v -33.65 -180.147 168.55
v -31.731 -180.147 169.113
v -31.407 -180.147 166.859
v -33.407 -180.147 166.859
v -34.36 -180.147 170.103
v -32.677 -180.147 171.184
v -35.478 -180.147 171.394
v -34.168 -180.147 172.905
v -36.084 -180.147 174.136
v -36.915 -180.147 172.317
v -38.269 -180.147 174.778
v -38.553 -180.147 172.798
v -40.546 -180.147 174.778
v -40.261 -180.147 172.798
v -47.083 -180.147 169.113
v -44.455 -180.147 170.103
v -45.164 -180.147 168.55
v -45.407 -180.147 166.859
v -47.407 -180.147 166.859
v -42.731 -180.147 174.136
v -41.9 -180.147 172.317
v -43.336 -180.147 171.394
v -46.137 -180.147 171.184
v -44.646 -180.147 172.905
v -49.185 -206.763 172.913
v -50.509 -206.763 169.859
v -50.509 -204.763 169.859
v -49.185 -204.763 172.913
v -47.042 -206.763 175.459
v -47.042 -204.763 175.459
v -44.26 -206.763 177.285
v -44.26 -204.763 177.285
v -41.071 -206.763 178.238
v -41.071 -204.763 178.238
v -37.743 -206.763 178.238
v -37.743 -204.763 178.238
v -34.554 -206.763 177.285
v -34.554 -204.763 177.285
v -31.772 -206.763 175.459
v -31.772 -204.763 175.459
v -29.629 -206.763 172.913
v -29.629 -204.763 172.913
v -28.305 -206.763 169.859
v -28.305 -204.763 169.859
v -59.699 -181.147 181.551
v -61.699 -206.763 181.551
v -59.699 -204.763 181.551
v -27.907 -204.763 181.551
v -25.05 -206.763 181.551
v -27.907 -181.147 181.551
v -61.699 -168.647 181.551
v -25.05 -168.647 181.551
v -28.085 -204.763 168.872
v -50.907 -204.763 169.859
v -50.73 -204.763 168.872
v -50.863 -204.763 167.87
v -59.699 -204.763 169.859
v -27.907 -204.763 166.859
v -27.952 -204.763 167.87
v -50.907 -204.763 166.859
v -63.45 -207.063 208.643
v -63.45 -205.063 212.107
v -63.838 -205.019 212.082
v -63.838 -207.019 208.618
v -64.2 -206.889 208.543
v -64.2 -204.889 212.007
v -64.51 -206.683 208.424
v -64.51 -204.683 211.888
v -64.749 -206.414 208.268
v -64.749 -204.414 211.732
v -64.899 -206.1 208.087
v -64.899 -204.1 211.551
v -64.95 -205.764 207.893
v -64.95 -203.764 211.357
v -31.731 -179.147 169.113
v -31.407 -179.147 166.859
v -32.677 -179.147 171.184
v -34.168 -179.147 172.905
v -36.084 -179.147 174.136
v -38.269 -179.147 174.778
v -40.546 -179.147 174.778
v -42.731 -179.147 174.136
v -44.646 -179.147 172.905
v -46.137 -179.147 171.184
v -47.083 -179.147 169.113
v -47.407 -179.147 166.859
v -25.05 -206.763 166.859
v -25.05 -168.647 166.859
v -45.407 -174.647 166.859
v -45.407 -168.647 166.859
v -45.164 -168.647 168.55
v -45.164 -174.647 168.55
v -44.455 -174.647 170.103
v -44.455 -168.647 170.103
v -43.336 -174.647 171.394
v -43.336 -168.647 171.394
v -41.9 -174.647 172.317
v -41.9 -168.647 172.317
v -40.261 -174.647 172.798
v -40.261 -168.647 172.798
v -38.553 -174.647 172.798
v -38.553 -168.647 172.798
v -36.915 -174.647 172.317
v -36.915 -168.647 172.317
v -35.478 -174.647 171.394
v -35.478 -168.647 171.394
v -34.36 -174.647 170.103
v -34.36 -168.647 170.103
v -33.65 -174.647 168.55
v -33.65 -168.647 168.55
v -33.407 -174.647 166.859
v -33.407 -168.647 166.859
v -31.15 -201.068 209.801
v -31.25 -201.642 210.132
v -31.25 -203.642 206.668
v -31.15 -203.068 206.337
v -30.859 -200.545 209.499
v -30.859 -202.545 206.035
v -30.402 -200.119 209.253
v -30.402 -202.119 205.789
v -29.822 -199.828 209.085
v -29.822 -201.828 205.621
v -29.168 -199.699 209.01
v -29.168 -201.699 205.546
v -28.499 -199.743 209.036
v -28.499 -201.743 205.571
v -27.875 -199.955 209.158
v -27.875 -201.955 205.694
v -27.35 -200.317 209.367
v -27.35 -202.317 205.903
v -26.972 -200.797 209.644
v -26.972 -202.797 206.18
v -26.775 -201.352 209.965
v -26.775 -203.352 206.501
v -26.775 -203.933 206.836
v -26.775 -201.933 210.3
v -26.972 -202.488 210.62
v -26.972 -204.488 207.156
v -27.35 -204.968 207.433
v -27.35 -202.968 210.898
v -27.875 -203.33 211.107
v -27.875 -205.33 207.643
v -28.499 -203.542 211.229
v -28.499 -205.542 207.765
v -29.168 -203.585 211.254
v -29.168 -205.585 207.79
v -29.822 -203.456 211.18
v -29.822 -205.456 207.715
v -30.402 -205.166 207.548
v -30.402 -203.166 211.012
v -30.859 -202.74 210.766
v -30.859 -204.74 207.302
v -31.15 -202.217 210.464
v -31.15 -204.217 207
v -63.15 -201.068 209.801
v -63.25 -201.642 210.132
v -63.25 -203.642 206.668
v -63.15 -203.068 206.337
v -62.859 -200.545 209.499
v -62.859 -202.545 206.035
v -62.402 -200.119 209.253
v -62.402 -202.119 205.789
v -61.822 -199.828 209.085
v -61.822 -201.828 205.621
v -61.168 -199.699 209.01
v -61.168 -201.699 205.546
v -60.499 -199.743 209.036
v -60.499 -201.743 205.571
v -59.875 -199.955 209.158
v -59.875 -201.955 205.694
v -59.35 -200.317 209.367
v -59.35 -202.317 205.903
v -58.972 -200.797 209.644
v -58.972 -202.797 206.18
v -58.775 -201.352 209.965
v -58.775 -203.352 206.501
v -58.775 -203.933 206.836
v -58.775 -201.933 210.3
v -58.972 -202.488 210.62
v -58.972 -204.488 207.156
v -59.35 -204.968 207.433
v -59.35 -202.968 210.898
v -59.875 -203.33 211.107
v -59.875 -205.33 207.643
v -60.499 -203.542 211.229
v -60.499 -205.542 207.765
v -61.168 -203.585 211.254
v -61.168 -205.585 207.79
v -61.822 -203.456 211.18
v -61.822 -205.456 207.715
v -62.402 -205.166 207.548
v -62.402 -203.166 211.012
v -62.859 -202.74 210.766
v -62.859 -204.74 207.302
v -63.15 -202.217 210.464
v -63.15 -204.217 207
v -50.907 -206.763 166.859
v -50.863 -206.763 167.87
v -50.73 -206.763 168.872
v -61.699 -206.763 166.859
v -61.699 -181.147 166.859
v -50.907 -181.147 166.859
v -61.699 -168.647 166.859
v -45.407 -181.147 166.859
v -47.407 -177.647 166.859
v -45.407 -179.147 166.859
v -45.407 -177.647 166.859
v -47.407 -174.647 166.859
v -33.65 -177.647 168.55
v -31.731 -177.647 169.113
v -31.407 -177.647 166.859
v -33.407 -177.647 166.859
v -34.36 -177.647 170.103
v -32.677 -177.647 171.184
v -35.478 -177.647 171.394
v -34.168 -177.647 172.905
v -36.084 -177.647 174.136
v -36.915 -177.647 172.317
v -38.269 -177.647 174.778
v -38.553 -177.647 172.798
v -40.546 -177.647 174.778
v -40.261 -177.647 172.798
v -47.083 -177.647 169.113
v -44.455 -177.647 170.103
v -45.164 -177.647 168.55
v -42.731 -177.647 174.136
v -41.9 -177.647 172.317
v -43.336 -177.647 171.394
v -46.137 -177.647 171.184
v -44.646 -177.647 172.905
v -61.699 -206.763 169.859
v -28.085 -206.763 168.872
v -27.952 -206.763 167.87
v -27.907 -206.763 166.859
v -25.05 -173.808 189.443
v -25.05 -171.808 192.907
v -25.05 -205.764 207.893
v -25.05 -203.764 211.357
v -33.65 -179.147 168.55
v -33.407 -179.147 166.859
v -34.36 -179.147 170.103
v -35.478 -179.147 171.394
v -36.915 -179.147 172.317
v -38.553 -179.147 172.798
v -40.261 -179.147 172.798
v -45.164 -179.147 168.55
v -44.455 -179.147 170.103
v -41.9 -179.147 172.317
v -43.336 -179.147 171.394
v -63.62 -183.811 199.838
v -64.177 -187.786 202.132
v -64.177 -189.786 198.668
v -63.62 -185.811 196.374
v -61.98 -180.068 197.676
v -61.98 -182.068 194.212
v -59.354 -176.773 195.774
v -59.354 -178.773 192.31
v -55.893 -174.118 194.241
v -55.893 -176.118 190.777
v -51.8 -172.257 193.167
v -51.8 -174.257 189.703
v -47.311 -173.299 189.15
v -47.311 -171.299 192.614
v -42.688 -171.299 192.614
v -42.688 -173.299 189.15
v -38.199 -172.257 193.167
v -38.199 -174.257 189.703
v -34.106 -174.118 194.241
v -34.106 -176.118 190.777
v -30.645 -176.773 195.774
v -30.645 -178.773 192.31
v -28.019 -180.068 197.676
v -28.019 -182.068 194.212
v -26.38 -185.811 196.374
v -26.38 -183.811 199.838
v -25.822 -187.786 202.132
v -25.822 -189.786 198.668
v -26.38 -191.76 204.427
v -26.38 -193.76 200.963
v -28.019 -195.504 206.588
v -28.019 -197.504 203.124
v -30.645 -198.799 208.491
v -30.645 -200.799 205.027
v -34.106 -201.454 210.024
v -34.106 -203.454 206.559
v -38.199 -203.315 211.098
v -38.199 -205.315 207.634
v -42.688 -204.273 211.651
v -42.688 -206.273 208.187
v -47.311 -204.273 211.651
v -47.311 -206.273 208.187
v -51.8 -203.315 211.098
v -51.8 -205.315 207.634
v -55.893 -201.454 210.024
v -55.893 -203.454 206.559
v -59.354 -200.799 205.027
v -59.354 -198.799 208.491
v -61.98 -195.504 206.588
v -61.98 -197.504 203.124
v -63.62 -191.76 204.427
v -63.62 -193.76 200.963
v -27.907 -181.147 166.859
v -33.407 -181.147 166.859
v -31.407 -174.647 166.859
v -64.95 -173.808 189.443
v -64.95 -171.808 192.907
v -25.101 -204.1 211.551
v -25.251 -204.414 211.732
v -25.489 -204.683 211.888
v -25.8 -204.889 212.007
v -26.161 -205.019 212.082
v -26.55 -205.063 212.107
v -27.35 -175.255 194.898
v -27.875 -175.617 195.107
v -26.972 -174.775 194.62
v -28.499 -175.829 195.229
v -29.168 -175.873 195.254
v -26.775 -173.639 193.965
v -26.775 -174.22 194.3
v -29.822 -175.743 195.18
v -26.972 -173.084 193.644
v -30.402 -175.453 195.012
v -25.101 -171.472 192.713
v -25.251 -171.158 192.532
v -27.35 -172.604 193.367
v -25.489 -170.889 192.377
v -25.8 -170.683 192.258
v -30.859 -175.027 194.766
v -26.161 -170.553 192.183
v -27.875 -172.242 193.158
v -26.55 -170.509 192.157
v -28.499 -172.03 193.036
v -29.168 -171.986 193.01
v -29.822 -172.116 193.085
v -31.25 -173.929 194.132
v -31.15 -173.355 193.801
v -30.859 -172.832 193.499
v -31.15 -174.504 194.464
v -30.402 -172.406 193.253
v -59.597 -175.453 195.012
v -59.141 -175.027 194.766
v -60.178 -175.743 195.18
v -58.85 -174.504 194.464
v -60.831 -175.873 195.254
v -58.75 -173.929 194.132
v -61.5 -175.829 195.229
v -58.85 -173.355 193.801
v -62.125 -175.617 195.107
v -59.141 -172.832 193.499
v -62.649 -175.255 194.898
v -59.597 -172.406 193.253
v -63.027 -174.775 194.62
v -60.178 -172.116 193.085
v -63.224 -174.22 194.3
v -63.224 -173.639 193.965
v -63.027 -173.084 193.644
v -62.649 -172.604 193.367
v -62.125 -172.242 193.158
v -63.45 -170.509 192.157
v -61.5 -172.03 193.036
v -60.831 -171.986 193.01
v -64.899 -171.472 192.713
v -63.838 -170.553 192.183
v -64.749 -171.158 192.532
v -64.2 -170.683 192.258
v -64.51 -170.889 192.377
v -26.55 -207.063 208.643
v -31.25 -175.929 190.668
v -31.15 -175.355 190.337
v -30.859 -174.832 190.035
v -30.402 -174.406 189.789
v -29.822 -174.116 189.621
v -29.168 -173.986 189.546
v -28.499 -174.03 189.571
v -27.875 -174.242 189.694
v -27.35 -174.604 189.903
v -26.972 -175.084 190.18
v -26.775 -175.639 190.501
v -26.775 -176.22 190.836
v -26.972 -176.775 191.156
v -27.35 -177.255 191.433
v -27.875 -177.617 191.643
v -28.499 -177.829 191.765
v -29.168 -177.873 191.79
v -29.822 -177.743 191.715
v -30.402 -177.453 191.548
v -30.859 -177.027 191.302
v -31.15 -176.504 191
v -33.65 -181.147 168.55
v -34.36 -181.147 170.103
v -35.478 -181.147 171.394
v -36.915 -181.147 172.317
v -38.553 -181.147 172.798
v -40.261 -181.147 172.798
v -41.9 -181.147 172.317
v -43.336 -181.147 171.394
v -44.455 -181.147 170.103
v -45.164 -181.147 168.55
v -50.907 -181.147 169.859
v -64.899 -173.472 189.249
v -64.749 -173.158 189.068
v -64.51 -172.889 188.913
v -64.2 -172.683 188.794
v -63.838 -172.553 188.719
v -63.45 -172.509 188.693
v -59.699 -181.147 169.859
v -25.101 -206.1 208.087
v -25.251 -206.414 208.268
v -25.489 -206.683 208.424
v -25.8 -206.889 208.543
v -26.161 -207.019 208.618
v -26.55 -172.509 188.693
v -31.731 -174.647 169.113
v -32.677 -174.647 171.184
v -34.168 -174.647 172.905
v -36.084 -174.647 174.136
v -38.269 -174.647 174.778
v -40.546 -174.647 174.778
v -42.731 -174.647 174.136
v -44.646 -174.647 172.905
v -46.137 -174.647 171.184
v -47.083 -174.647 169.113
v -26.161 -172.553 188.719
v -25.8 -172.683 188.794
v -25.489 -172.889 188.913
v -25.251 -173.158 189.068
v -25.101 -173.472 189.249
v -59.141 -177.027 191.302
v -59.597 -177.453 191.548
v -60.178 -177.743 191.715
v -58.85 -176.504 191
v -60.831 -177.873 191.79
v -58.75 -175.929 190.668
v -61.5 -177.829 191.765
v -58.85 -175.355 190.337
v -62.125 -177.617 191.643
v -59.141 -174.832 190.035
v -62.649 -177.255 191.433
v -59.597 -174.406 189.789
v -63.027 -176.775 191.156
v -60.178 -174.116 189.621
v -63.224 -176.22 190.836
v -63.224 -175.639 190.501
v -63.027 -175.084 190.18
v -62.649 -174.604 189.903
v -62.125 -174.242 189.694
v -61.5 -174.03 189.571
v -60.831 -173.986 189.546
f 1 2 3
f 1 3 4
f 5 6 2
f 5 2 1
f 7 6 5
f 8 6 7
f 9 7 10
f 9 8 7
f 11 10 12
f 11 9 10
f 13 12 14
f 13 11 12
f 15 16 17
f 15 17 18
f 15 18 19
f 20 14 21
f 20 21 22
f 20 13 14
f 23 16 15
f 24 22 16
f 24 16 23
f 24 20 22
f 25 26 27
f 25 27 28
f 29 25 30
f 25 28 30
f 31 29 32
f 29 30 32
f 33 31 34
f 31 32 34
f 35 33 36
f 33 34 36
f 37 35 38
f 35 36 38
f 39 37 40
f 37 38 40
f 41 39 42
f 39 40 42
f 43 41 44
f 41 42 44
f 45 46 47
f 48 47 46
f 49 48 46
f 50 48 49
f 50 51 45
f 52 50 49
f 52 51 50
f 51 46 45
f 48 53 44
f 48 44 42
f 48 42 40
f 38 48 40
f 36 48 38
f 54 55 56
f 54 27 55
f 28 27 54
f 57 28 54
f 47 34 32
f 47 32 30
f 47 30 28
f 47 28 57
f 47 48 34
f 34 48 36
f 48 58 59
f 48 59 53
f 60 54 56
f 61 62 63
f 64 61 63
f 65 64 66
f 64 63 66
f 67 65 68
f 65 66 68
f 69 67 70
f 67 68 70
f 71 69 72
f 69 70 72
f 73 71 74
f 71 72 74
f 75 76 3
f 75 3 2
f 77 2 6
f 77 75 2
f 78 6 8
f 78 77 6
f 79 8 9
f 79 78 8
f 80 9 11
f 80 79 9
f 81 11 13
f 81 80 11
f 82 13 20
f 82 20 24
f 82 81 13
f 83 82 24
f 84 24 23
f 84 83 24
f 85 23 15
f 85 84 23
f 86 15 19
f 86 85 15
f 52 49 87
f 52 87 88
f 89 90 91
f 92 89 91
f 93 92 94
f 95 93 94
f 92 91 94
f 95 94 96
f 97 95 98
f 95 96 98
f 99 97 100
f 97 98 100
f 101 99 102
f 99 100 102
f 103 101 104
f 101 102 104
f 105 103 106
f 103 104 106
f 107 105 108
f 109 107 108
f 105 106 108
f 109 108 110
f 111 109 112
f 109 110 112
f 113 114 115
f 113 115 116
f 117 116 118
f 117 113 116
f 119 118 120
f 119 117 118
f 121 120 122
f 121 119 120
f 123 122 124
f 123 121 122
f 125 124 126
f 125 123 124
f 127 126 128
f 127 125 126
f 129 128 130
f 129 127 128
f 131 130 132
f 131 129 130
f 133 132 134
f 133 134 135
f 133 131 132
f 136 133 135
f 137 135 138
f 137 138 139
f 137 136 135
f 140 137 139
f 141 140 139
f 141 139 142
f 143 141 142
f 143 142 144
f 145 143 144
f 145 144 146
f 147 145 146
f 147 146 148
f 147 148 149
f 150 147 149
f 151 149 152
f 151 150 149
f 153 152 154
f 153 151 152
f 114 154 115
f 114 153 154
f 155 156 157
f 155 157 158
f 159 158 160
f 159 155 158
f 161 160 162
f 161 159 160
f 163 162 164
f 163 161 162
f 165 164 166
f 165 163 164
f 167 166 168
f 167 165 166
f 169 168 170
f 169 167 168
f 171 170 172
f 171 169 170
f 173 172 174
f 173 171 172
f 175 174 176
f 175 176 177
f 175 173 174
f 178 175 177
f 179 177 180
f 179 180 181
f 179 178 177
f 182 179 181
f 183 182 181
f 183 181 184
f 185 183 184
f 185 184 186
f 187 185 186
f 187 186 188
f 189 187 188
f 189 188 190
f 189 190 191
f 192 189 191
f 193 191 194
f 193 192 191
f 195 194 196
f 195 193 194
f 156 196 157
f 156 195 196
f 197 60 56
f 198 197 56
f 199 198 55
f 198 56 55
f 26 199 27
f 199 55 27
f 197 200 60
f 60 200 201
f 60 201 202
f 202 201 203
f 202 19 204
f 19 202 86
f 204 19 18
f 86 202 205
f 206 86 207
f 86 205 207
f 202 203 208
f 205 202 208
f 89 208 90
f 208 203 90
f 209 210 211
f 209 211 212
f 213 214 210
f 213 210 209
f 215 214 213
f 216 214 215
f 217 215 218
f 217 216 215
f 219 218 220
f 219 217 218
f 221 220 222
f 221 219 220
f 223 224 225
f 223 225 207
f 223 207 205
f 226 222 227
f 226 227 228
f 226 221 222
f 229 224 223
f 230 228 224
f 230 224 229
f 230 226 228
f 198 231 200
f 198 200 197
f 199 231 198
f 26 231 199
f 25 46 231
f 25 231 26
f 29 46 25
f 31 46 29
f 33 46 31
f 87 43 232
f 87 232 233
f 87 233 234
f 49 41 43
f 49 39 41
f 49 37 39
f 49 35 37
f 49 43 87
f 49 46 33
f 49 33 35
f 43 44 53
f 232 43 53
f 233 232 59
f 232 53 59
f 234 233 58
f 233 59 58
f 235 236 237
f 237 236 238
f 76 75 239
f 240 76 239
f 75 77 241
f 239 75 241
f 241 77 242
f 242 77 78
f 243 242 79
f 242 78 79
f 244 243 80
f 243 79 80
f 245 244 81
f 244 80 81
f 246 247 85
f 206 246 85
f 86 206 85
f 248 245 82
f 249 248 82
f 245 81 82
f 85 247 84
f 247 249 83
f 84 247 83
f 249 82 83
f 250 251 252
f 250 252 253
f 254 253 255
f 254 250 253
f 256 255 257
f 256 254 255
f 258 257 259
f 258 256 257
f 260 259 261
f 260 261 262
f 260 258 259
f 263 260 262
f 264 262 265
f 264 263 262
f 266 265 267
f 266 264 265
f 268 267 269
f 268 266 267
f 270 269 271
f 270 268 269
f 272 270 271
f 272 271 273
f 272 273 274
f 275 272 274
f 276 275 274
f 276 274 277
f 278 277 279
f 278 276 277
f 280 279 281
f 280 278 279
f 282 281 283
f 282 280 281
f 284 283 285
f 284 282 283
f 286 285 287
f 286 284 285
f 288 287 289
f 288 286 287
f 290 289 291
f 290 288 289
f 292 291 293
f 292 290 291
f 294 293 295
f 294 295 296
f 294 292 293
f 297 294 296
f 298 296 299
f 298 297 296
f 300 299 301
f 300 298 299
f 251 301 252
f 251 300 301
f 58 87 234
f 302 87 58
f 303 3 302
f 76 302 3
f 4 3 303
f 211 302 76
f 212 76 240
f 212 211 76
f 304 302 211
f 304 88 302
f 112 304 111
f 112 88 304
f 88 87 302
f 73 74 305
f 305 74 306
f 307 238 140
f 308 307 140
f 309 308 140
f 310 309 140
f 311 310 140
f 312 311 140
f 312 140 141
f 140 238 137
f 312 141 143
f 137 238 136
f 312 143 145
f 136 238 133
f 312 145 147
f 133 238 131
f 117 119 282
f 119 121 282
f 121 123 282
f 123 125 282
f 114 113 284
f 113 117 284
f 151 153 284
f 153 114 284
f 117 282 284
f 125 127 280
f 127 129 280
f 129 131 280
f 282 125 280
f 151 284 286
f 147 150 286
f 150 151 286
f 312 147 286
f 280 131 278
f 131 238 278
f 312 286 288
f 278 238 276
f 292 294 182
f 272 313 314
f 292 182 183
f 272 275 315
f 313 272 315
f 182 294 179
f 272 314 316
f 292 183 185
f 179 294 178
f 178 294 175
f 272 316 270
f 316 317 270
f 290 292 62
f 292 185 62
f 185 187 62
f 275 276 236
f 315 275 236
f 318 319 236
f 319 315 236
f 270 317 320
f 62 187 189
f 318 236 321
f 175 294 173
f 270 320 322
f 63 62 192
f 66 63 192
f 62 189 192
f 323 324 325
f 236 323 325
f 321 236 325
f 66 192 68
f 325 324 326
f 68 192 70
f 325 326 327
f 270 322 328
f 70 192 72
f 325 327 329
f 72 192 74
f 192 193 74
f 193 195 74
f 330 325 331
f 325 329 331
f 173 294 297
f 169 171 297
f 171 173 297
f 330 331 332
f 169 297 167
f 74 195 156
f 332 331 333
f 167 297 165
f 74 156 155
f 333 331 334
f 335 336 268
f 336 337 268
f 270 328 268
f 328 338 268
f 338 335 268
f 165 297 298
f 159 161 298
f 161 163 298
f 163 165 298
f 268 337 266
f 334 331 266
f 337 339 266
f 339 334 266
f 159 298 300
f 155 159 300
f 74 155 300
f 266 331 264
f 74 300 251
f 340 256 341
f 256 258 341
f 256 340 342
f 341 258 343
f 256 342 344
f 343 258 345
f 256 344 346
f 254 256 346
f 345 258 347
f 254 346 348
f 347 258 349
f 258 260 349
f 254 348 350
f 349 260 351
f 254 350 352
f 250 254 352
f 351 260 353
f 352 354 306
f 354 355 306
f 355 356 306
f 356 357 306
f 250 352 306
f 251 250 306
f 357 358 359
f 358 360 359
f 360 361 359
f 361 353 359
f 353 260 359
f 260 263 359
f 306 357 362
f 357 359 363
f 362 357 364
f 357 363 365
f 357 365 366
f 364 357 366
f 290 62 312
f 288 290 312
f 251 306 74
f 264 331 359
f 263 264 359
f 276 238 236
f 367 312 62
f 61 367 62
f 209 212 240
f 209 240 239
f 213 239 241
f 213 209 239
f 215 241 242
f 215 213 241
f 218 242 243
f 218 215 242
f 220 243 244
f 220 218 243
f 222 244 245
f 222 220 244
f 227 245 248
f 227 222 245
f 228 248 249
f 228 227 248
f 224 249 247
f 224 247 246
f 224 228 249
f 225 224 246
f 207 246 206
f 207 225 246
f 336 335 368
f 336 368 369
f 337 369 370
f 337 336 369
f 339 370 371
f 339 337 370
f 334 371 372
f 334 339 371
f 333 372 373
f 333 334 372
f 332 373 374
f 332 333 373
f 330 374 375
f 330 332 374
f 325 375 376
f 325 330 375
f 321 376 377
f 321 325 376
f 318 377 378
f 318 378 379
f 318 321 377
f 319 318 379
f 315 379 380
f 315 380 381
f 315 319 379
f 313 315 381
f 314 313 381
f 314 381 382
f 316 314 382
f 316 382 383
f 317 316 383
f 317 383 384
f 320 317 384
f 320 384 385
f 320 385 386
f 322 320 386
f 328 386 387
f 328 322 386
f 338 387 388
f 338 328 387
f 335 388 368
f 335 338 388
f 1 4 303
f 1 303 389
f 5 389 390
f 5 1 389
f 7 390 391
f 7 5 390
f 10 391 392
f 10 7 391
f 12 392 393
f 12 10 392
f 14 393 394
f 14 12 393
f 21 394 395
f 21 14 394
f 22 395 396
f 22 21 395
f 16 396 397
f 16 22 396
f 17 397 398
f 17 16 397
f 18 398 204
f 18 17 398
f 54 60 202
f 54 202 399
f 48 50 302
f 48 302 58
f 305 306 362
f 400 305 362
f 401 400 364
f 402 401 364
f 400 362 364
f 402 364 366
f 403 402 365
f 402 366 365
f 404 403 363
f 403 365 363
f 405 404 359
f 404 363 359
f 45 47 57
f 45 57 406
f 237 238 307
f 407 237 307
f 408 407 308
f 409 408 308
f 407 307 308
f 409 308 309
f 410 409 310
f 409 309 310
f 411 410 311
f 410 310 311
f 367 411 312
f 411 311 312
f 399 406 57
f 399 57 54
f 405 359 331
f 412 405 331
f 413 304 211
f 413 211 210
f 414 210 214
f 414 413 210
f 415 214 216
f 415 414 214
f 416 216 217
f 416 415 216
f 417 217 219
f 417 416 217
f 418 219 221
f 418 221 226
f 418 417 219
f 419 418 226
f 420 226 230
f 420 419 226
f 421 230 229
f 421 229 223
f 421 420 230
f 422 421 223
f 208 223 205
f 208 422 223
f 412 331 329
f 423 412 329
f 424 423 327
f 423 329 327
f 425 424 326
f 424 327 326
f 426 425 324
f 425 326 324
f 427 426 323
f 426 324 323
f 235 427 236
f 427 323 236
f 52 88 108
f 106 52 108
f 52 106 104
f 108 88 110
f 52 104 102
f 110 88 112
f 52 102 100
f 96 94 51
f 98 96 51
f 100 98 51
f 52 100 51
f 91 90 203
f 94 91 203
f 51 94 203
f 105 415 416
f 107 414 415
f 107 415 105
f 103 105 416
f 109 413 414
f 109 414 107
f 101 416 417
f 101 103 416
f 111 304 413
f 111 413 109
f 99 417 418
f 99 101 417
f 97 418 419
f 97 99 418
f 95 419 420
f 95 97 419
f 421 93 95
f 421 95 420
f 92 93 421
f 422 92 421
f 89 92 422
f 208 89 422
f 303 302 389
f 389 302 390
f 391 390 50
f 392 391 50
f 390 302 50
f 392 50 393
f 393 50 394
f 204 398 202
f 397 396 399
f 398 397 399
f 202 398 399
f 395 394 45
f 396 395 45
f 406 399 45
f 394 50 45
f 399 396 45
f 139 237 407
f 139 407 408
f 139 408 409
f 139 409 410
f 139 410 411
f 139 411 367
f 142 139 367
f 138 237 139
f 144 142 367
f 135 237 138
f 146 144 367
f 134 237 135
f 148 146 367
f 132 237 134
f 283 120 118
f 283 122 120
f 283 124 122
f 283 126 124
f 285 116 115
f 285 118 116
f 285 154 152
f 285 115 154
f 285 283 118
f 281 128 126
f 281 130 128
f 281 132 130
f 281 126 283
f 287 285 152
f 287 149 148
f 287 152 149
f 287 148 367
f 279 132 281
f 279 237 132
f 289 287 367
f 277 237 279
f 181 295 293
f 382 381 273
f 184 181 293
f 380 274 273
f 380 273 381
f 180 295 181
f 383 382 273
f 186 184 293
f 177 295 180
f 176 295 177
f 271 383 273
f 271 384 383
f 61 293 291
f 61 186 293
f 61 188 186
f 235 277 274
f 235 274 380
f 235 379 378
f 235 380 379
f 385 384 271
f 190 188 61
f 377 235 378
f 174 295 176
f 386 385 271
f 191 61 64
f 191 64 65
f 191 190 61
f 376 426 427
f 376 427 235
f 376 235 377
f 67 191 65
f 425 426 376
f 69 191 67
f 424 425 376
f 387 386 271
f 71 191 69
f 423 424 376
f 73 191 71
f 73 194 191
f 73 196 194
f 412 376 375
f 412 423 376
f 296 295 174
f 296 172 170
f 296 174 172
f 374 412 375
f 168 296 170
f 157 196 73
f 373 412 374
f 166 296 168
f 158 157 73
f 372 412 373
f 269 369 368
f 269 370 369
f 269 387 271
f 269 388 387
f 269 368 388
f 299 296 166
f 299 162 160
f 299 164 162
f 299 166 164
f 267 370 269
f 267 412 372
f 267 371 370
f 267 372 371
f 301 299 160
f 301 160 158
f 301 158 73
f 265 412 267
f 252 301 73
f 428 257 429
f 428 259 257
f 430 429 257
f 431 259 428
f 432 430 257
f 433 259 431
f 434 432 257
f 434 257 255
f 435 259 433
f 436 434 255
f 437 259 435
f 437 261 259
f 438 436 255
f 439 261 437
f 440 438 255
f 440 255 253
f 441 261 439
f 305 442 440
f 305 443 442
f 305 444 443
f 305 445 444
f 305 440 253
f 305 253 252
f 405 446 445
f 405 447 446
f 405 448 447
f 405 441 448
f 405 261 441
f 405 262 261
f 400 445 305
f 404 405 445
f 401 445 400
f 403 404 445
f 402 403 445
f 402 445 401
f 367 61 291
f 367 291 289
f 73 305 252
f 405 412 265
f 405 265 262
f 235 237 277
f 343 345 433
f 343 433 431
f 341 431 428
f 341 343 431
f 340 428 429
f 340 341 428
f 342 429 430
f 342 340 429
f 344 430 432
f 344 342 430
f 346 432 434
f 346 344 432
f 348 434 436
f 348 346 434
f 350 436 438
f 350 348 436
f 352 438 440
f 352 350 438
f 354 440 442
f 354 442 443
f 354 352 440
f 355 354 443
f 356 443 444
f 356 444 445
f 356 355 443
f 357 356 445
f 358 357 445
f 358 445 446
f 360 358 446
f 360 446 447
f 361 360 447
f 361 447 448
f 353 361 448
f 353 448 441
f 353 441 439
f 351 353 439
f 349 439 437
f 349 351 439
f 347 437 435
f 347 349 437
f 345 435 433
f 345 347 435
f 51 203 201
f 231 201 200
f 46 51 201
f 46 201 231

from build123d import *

# Parameters (mm, degrees)
BOSS_EXTRUDE1_DEPTH = 6
BOSS_EXTRUDE2_DEPTH = 3
BOSS_EXTRUDE3_DEPTH = 1.5
BOSS_EXTRUDE4_DEPTH = 1
BOSS_EXTRUDE5_DEPTH = 1
SKETCH6_W           = 10.792208911
SKETCH6_H           = 3
SKETCH6_W_2         = 2.857563286
BOSS_EXTRUDE6_DEPTH = 25.615903
BOSS_EXTRUDE7_START = -2
BOSS_EXTRUDE7_DEPTH = 2
BOSS_EXTRUDE8_DEPTH = 11.691588
CUT_EXTRUDE1_DEPTH  = 2
SKETCH10_R          = 19.177152658
BOSS_EXTRUDE9_DEPTH = 4


with BuildPart() as part:
    # Sketch1 → Boss-Extrude1 (new body)
    with BuildSketch(Plane(origin=(0, -168.647191902, 0), x_dir=(1, 0, 0), z_dir=(0, 1, 0))):
        with BuildLine():
            Line((-33.407184222, -166.859176326), (-25.049620936, -166.859176326))
            Line((-25.049620936, -166.859176326), (-25.049620936, -172.050763846))
            Line((-25.049620936, -172.050763846), (-25.049620936, -181.550763846))
            Line((-25.049620936, -181.550763846), (-61.699393133, -181.550763846))
            Line((-61.699393133, -181.550763846), (-61.699393133, -166.859176326))
            Line((-61.699393133, -166.859176326), (-45.407184222, -166.859176326))
            ThreePointArc((-45.407184222, -166.859176326), (-39.407184222, -172.859176326), (-33.407184222, -166.859176326))
        make_face()
    extrude(amount=-BOSS_EXTRUDE1_DEPTH)

    # Sketch2 → Boss-Extrude2 (add)
    with BuildSketch(Plane.XZ.offset(174.647191902)):
        with BuildLine():
            Line((-47.407184222, 166.859176326), (-61.699393133, 166.859176326))
            Line((-61.699393133, 166.859176326), (-61.699393133, 181.550763846))
            Line((-61.699393133, 181.550763846), (-25.049620936, 181.550763846))
            Line((-25.049620936, 181.550763846), (-25.049620936, 166.859176326))
            Line((-25.049620936, 166.859176326), (-31.407184222, 166.859176326))
            ThreePointArc((-31.407184222, 166.859176326), (-39.407184222, 174.859176326), (-47.407184222, 166.859176326))
        make_face()
    extrude(amount=BOSS_EXTRUDE2_DEPTH)

    # Sketch3 → Boss-Extrude3 (add)
    with BuildSketch(Plane.XZ.offset(177.647191902)):
        with BuildLine():
            Line((-45.407184222, 166.859176326), (-61.699393133, 166.859176326))
            Line((-61.699393133, 166.859176326), (-61.699393133, 181.550763846))
            Line((-61.699393133, 181.550763846), (-25.049620936, 181.550763846))
            Line((-25.049620936, 181.550763846), (-25.049620936, 166.859176326))
            Line((-25.049620936, 166.859176326), (-33.407184222, 166.859176326))
            ThreePointArc((-33.407184222, 166.859176326), (-39.407184222, 172.859176326), (-45.407184222, 166.859176326))
        make_face()
    extrude(amount=BOSS_EXTRUDE3_DEPTH)

    # Sketch4 → Boss-Extrude4 (add)
    with BuildSketch(Plane.XZ.offset(179.147191902)):
        with BuildLine():
            Line((-47.407184222, 166.859176326), (-61.699393133, 166.859176326))
            Line((-61.699393133, 166.859176326), (-61.699393133, 181.550763846))
            Line((-61.699393133, 181.550763846), (-25.049620936, 181.550763846))
            Line((-25.049620936, 181.550763846), (-25.049620936, 166.859176326))
            Line((-25.049620936, 166.859176326), (-31.407184222, 166.859176326))
            ThreePointArc((-31.407184222, 166.859176326), (-39.407184222, 174.859176326), (-47.407184222, 166.859176326))
        make_face()
    extrude(amount=BOSS_EXTRUDE4_DEPTH)

    # Sketch5 → Boss-Extrude5 (add)
    with BuildSketch(Plane.XZ.offset(180.147191902)):
        with BuildLine():
            Line((-45.407184222, 166.859176326), (-61.699393133, 166.859176326))
            Line((-61.699393133, 166.859176326), (-61.699393133, 181.550763846))
            Line((-61.699393133, 181.550763846), (-25.049620936, 181.550763846))
            Line((-25.049620936, 181.550763846), (-25.049620936, 166.859176326))
            Line((-25.049620936, 166.859176326), (-33.407184222, 166.859176326))
            ThreePointArc((-33.407184222, 166.859176326), (-39.407184222, 172.859176326), (-45.407184222, 166.859176326))
        make_face()
    extrude(amount=BOSS_EXTRUDE5_DEPTH)

    # Sketch6 → Boss-Extrude6 (add)
    with BuildSketch(Plane.XZ.offset(181.147191902)):
        with Locations((-56.303288678, 168.359176326)):
            Rectangle(SKETCH6_W, SKETCH6_H)
        with Locations((-26.478402579, 168.359176326)):
            Rectangle(SKETCH6_W_2, SKETCH6_H)
    extrude(amount=BOSS_EXTRUDE6_DEPTH)

    # Sketch7 → Boss-Extrude7 (add)
    with BuildSketch(Plane.XZ.offset(206.763094952).offset(BOSS_EXTRUDE7_START)):
        with BuildLine():
            Line((-53.764747509, 166.859176326), (-50.907184222, 166.859176326))
            ThreePointArc((-50.907184222, 166.859176326), (-39.407184222, 178.359176326), (-27.907184222, 166.859176326))
            Line((-27.907184222, 166.859176326), (-25.049620936, 166.859176326))
            ThreePointArc((-25.049620936, 166.859176326), (-39.407184222, 181.216739613), (-53.764747509, 166.859176326))
        make_face()
    extrude(amount=BOSS_EXTRUDE7_DEPTH)

    # Sketch8 → Boss-Extrude8 (add)
    with BuildSketch(Plane.XY.offset(181.550763846)):
        Polygon((-25.366542373, -206.763094952), (-25.049620936, -206.763094952), (-25.049620936, -181.147191902), (-27.907184222, -181.147191902), (-27.907184222, -204.763094952), (-50.907184222, -204.763094952), (-59.699393133, -204.763094952), (-59.699393133, -181.147191902), (-61.699393133, -181.147191902), (-61.699393133, -206.763094952), (-53.447826071, -206.763094952), align=None)
    extrude(amount=-BOSS_EXTRUDE8_DEPTH)

    # Sketch9 → Cut-Extrude1 (cut)
    with BuildSketch(Plane.XZ.offset(206.763094952)):
        with BuildLine():
            Line((-50.907184222, 166.859176326), (-27.907184222, 166.859176326))
            ThreePointArc((-27.907184222, 166.859176326), (-39.407184222, 178.359176326), (-50.907184222, 166.859176326))
        make_face()
    extrude(amount=-CUT_EXTRUDE1_DEPTH, mode=Mode.SUBTRACT)


with BuildPart() as body_2:
    # Sketch10 → Boss-Extrude9 (new body)
    with BuildSketch(Plane(origin=(0, 40.579403079, 70.285587874), x_dir=(-1, 0, 0), z_dir=(0, -0.5, -0.866025404))):
        with BuildLine():
            Line((26.549620936, -283.643524725), (63.449620936, -283.643524725))
            ThreePointArc((63.449620936, -283.643524725), (64.510281107, -283.204184897), (64.949620936, -282.143524725))
            Line((64.949620936, -282.143524725), (64.949620936, -245.243524725))
            ThreePointArc((64.949620936, -245.243524725), (64.510281107, -244.182864553), (63.449620936, -243.743524725))
            Line((63.449620936, -243.743524725), (26.549620936, -243.743524725))
            ThreePointArc((26.549620936, -243.743524725), (25.488960764, -244.182864553), (25.049620936, -245.243524725))
            Line((25.049620936, -245.243524725), (25.049620936, -282.143524725))
            ThreePointArc((25.049620936, -282.143524725), (25.488960764, -283.204184897), (26.549620936, -283.643524725))
        make_face()
        with Locations((44.999620936, -263.693524725)):
            Circle(SKETCH10_R, mode=Mode.SUBTRACT)
        with BuildLine():
            ThreePointArc((26.749620936, -279.693524725), (28.999620936, -281.943524725), (31.249620936, -279.693524725))
            ThreePointArc((31.249620936, -279.693524725), (28.999620936, -277.443524725), (26.749620936, -279.693524725))
        make_face(mode=Mode.SUBTRACT)
        with BuildLine():
            ThreePointArc((58.749620936, -279.693524725), (60.999620936, -281.943524725), (63.249620936, -279.693524725))
            ThreePointArc((63.249620936, -279.693524725), (60.999620936, -277.443524725), (58.749620936, -279.693524725))
        make_face(mode=Mode.SUBTRACT)
        with BuildLine():
            ThreePointArc((26.749620936, -247.693524725), (28.999620936, -249.943524725), (31.249620936, -247.693524725))
            ThreePointArc((31.249620936, -247.693524725), (28.999620936, -245.443524725), (26.749620936, -247.693524725))
        make_face(mode=Mode.SUBTRACT)
        with BuildLine():
            ThreePointArc((63.249620936, -247.693524725), (60.999620936, -245.443524725), (58.749620936, -247.693524725))
            ThreePointArc((58.749620936, -247.693524725), (60.999620936, -249.943524725), (63.249620936, -247.693524725))
        make_face(mode=Mode.SUBTRACT)
    extrude(amount=BOSS_EXTRUDE9_DEPTH)


solid = Compound([part.part, body_2.part])
